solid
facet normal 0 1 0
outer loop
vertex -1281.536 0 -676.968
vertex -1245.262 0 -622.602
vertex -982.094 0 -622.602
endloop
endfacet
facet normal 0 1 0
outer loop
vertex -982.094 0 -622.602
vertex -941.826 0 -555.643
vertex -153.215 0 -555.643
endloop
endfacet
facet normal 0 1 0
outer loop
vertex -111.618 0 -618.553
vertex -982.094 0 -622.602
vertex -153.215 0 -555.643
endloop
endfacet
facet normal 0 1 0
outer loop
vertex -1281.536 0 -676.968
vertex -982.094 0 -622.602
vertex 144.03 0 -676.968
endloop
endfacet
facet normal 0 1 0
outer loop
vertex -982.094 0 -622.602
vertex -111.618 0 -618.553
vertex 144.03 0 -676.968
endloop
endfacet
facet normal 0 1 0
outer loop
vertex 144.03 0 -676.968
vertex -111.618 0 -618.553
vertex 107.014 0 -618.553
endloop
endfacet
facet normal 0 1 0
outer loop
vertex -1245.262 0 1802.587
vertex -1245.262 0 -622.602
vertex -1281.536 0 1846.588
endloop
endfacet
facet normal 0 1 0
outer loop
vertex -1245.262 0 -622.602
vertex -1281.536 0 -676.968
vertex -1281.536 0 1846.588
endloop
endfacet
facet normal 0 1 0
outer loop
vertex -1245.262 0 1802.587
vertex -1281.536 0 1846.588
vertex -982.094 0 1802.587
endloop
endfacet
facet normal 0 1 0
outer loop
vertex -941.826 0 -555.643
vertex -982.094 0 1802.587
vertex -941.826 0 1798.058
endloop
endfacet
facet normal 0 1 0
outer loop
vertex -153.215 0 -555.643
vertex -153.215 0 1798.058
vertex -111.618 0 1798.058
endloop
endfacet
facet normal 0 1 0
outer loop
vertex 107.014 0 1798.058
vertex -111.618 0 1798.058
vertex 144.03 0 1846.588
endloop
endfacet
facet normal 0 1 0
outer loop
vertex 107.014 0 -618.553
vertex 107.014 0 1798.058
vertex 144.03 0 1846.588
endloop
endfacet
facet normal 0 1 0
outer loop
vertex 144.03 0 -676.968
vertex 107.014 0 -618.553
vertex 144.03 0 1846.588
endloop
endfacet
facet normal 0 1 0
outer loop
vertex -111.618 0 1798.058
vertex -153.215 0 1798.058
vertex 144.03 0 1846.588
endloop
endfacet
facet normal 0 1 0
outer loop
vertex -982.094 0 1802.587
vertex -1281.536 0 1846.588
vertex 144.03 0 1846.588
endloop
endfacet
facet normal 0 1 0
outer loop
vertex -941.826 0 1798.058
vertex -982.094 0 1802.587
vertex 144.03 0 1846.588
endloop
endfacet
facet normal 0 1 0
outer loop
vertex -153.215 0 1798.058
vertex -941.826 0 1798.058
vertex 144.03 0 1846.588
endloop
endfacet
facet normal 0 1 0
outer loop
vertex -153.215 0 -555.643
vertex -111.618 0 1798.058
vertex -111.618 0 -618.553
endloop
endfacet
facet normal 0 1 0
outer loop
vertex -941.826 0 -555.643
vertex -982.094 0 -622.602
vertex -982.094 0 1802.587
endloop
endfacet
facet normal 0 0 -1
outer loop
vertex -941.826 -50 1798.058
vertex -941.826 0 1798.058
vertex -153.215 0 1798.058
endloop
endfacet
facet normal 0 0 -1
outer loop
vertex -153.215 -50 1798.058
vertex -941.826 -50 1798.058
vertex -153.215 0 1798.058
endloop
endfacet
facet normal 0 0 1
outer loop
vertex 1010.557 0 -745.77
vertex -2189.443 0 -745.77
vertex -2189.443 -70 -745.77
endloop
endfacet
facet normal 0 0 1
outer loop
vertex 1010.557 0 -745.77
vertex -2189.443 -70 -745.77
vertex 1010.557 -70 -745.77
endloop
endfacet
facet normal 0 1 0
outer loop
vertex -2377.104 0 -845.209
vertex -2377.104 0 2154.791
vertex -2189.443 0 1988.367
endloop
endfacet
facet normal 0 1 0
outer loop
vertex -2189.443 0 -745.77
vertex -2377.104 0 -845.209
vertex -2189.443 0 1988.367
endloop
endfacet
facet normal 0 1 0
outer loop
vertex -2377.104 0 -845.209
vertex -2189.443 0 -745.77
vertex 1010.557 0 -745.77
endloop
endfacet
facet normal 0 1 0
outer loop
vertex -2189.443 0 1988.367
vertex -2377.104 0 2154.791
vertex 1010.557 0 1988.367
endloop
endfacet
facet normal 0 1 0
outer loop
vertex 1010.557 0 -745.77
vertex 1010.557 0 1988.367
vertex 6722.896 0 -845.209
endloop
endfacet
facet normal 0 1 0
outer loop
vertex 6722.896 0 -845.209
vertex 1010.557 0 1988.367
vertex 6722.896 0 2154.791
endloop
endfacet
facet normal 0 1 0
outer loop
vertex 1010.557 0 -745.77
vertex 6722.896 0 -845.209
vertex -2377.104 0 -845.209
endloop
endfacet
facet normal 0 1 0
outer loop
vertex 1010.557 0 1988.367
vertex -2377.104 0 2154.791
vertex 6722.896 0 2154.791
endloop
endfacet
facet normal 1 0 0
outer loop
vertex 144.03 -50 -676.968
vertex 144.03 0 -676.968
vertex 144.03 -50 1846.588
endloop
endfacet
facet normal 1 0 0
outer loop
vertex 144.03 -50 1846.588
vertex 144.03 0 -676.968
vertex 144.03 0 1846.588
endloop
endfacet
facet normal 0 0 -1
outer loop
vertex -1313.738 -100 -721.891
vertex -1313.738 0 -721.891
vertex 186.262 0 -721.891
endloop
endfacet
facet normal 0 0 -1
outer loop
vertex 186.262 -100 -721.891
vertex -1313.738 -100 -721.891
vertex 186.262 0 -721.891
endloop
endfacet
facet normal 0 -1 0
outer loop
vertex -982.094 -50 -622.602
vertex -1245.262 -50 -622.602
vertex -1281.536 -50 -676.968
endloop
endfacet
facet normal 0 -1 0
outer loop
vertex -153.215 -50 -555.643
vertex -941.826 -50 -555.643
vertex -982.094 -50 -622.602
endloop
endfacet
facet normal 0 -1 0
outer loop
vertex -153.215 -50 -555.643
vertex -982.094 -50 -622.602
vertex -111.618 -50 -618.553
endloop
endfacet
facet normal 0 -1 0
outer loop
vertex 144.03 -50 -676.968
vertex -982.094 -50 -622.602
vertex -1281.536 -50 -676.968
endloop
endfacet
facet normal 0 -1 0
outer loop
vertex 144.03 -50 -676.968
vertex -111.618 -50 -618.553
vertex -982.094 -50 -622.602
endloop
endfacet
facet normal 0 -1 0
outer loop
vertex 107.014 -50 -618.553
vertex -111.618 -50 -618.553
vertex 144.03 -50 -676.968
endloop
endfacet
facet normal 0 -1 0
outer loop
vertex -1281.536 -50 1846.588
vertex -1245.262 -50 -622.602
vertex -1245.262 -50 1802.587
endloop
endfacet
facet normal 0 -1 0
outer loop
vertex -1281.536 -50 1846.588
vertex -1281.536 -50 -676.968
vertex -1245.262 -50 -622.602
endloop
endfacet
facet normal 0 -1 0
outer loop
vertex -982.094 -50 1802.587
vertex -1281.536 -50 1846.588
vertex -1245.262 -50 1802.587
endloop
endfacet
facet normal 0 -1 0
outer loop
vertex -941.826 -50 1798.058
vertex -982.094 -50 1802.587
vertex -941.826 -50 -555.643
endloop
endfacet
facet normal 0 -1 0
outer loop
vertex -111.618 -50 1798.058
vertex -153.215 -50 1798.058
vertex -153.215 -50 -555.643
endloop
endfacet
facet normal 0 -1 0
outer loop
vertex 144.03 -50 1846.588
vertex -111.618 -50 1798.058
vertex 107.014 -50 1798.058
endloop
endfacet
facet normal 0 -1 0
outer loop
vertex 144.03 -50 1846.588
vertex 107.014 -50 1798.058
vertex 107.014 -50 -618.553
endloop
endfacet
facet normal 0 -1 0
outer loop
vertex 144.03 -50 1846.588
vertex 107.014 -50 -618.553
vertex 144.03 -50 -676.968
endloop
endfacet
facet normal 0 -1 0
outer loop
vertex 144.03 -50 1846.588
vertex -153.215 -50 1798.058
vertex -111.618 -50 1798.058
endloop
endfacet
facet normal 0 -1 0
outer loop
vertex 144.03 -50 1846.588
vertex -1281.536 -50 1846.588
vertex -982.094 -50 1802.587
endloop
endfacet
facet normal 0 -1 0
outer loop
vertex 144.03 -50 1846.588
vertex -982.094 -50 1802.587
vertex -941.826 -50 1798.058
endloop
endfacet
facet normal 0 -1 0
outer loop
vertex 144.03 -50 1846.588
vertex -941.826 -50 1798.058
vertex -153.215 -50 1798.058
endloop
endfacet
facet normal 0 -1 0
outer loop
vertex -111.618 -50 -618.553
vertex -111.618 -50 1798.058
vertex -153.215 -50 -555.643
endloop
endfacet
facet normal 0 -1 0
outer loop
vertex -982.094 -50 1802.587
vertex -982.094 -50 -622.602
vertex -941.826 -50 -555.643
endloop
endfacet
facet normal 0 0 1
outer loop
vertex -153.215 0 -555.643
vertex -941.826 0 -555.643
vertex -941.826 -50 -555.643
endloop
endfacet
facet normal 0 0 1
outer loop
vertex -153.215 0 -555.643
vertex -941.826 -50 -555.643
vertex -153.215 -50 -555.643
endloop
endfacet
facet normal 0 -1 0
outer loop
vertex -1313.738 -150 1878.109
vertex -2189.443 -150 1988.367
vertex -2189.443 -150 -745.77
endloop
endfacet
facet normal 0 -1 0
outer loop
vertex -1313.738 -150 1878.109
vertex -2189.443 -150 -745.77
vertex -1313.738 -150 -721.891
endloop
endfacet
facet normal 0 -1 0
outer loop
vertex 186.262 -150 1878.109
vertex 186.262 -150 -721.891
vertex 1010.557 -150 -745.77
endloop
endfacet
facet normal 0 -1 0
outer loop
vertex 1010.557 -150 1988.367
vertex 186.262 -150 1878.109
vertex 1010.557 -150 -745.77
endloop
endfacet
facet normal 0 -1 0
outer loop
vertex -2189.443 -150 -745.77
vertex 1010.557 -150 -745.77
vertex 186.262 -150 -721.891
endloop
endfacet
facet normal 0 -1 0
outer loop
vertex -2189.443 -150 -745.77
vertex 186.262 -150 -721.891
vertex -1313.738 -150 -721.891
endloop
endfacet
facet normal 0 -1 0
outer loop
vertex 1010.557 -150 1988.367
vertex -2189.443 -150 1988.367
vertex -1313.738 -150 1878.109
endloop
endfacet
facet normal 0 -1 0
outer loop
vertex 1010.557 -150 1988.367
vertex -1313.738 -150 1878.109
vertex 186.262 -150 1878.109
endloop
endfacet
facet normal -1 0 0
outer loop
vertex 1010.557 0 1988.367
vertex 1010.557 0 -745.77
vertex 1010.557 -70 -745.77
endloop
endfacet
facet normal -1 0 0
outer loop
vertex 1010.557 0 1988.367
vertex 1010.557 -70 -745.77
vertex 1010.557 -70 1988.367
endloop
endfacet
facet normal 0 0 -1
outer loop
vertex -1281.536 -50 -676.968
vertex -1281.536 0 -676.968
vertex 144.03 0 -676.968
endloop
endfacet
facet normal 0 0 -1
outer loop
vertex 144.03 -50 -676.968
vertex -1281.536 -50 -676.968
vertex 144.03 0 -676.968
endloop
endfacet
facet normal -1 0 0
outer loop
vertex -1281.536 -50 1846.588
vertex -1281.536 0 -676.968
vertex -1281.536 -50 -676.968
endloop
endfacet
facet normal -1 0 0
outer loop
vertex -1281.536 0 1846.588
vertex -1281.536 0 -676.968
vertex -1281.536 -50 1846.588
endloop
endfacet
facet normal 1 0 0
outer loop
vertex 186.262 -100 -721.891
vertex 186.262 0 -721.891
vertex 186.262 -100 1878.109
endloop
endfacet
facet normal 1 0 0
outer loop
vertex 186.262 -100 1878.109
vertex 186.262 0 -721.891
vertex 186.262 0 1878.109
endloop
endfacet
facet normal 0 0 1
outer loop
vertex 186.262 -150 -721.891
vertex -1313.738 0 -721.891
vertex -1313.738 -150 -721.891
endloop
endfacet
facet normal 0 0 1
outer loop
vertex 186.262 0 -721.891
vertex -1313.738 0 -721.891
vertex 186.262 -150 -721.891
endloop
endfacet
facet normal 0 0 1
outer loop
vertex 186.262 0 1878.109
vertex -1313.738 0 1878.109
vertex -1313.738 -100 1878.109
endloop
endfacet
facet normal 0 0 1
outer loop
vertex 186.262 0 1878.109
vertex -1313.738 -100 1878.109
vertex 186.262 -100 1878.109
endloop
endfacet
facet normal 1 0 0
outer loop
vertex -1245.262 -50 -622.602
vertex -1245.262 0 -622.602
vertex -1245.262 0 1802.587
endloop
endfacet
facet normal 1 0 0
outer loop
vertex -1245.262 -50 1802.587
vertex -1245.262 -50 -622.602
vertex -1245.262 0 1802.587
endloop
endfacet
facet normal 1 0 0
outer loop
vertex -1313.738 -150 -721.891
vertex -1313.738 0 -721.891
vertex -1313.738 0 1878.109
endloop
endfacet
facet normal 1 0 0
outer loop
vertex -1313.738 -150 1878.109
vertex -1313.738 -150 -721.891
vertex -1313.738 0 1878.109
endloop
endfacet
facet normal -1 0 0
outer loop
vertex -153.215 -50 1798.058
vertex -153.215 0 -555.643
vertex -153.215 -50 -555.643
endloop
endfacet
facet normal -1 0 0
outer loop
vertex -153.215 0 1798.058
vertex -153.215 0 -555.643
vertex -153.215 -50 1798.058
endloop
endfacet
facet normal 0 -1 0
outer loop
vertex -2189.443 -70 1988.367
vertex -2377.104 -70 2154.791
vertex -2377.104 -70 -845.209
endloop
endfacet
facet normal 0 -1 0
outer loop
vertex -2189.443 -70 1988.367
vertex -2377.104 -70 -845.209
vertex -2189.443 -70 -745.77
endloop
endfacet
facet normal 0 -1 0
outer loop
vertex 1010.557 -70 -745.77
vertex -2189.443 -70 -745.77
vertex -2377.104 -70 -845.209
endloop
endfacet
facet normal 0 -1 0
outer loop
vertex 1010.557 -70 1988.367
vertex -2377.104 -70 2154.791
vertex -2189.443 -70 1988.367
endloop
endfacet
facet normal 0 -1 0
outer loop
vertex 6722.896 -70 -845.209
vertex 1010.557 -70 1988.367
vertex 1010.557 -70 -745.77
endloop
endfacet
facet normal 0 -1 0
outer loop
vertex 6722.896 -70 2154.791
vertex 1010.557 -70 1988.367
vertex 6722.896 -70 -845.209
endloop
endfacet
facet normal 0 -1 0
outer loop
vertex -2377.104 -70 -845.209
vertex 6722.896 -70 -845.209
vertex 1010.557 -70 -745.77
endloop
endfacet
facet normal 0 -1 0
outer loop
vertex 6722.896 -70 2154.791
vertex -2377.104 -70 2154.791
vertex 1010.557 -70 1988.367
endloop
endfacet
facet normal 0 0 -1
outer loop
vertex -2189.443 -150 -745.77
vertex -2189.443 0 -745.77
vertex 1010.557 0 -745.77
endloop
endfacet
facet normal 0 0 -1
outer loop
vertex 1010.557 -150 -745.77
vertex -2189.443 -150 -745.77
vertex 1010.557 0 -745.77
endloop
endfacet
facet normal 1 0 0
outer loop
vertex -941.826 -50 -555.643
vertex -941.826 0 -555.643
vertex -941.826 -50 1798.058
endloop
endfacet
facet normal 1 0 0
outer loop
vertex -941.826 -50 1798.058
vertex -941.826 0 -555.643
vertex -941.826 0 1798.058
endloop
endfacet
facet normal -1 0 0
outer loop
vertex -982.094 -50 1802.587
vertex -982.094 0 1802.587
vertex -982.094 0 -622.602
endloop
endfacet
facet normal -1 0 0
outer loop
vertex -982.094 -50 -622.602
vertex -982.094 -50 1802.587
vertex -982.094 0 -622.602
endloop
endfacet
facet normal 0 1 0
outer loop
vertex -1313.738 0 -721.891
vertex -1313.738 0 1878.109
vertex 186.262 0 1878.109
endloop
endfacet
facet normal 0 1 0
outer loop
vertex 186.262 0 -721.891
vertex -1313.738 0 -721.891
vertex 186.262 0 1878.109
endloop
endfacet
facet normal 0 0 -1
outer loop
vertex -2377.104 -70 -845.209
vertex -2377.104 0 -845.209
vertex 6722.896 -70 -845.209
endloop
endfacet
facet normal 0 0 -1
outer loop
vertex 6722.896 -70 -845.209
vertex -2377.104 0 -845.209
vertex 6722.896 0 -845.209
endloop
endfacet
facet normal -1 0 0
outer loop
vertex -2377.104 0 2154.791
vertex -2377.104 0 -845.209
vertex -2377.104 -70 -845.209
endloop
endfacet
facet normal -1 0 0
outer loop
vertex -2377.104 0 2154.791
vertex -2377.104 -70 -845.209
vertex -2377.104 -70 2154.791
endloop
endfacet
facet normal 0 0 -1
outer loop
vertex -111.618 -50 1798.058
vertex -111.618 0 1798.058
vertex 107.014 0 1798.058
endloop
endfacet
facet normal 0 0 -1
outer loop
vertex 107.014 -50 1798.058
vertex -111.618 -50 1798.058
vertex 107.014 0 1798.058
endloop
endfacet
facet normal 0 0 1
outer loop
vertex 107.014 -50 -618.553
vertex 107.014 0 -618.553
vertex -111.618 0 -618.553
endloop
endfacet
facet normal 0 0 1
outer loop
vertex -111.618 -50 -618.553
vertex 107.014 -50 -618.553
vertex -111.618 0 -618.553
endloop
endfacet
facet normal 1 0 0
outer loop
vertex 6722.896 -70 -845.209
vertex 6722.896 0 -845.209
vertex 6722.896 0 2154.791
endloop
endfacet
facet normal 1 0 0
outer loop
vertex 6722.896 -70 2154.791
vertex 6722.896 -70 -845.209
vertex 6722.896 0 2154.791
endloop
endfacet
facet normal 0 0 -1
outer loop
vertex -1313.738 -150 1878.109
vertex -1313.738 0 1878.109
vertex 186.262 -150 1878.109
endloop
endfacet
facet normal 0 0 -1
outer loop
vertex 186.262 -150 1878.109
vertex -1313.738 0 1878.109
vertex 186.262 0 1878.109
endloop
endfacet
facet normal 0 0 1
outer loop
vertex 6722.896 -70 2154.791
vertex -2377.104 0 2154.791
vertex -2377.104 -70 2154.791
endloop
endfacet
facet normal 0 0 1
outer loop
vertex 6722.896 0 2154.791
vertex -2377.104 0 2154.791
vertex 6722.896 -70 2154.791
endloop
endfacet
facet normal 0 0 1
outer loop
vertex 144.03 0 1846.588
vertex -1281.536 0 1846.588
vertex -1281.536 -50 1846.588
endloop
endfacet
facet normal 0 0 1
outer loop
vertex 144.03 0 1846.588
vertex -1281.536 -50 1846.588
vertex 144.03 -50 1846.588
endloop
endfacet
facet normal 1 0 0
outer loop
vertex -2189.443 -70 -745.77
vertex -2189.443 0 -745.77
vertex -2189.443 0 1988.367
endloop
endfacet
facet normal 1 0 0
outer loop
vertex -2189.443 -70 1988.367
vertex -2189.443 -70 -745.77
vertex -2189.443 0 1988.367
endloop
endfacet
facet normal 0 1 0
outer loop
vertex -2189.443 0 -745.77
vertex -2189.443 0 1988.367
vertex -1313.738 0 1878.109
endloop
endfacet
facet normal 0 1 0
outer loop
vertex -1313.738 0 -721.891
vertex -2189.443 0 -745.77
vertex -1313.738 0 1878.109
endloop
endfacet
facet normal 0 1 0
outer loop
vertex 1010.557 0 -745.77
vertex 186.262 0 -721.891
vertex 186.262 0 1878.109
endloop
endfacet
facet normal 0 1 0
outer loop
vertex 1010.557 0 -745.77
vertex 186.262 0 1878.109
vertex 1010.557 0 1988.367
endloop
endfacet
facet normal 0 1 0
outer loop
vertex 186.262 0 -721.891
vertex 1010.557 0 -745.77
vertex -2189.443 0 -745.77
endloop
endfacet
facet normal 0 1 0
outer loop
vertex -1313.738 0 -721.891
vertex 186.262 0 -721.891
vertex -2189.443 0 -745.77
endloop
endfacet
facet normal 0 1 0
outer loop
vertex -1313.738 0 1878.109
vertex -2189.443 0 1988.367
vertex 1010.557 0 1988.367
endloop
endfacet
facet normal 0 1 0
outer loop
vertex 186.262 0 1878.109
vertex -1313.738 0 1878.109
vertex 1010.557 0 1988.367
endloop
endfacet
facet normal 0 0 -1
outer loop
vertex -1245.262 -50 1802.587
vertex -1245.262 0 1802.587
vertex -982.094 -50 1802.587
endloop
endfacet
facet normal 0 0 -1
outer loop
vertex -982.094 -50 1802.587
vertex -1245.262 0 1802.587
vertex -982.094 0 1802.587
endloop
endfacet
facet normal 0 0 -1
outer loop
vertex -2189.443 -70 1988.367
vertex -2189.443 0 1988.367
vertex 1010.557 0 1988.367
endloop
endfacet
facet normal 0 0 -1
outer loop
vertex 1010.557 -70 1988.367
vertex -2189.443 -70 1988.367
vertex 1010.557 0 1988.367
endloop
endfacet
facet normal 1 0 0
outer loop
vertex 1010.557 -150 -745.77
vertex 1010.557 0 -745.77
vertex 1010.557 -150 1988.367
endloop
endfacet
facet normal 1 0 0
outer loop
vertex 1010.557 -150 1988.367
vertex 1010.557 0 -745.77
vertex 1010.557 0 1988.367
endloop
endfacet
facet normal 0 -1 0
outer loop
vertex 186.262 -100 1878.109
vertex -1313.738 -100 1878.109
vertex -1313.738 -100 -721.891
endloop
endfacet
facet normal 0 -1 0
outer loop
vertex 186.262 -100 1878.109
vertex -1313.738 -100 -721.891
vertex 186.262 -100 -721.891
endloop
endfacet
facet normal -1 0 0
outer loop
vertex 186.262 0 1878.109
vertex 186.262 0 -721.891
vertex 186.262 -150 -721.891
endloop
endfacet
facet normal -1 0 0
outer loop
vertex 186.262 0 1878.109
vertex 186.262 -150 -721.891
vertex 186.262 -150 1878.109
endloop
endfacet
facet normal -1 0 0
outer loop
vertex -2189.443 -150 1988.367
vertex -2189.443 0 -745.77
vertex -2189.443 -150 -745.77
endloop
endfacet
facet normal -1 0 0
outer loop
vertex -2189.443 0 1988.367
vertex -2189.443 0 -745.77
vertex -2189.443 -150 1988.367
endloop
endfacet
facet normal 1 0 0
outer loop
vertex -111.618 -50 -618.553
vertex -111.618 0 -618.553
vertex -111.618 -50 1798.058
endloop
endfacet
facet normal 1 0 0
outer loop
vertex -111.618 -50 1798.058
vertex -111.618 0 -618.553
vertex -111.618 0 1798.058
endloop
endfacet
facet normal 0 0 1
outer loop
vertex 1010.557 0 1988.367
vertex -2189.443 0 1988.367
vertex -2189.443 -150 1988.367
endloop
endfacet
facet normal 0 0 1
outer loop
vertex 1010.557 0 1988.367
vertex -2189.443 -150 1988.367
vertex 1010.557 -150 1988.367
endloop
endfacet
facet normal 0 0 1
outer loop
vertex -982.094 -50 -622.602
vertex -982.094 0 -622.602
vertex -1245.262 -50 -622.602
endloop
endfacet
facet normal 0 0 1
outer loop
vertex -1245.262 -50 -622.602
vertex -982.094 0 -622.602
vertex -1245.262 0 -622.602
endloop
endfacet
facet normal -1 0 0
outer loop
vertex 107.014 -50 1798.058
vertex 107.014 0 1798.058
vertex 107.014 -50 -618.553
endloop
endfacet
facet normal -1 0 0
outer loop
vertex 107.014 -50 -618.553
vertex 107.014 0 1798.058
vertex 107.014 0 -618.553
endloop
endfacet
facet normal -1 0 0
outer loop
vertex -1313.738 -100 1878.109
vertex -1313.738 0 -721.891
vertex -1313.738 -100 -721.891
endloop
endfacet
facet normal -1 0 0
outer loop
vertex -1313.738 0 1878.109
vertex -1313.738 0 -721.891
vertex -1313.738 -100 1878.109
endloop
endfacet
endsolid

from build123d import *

# Parameters (mm, degrees)
F0_W     = 9100
F0_H     = 3000
F0_W_2   = 3200
F0_H_2   = 2734.136701
F1_DEPTH = 70
F0_W_3   = 1500
F0_H_3   = 2600
F2_DEPTH = 150
F3_DEPTH = 100
F4_W     = 1425.566227
F4_H     = 2523.555457
F4_W_2   = 788.61104
F4_H_2   = 2353.700698
F5_DEPTH = 50


with BuildPart() as f1:
    # F0 (on Front) → F1 (new body)
    with BuildSketch(Plane.XZ):
        with Locations((2172.895898, 654.79085)):
            Rectangle(F0_W, F0_H)
        with Locations((-589.442599, 621.29873)):
            Rectangle(F0_W_2, F0_H_2, mode=Mode.SUBTRACT)
    extrude(amount=F1_DEPTH)


with BuildPart() as f2:
    # F0 (on Front) → F2 (new body)
    with BuildSketch(Plane.XZ):
        with Locations((-589.442599, 621.29873)):
            Rectangle(F0_W_2, F0_H_2)
        with Locations((-563.738128, 578.109205)):
            Rectangle(F0_W_3, F0_H_3, mode=Mode.SUBTRACT)
    extrude(amount=F2_DEPTH)


with BuildPart() as f3:
    # F0 (on Front) → F3 (new body)
    with BuildSketch(Plane.XZ):
        with Locations((-563.738128, 578.109205)):
            Rectangle(F0_W_3, F0_H_3)
    extrude(amount=F3_DEPTH)


with BuildPart() as f5:
    # F4 (on Front) → F5 (new body)
    with BuildSketch(Plane.XZ):
        with Locations((-568.752632, 584.810168)):
            Rectangle(F4_W, F4_H)
        Polygon((-1245.261669, 806.599259), (-1245.261669, 1802.586555), (-982.094228, 1802.586555), (-982.094228, 806.599259), (-982.094228, 478.652209), (-982.094228, -622.602105), (-1245.261669, -622.602105), (-1245.261669, 478.652209), align=None, mode=Mode.SUBTRACT)
        with Locations((-547.520764, 621.207565)):
            Rectangle(F4_W_2, F4_H_2, mode=Mode.SUBTRACT)
        Polygon((-111.617535, 1798.057914), (107.013837, 1798.057914), (107.013837, 851.135254), (107.013837, 470.554739), (107.013837, -618.55334), (-111.617535, -618.55334), (-111.617535, 470.554739), (-111.617535, 851.135254), align=None, mode=Mode.SUBTRACT)
    extrude(amount=F5_DEPTH)


solid = Compound([f1.part, f2.part, f3.part, f5.part])
